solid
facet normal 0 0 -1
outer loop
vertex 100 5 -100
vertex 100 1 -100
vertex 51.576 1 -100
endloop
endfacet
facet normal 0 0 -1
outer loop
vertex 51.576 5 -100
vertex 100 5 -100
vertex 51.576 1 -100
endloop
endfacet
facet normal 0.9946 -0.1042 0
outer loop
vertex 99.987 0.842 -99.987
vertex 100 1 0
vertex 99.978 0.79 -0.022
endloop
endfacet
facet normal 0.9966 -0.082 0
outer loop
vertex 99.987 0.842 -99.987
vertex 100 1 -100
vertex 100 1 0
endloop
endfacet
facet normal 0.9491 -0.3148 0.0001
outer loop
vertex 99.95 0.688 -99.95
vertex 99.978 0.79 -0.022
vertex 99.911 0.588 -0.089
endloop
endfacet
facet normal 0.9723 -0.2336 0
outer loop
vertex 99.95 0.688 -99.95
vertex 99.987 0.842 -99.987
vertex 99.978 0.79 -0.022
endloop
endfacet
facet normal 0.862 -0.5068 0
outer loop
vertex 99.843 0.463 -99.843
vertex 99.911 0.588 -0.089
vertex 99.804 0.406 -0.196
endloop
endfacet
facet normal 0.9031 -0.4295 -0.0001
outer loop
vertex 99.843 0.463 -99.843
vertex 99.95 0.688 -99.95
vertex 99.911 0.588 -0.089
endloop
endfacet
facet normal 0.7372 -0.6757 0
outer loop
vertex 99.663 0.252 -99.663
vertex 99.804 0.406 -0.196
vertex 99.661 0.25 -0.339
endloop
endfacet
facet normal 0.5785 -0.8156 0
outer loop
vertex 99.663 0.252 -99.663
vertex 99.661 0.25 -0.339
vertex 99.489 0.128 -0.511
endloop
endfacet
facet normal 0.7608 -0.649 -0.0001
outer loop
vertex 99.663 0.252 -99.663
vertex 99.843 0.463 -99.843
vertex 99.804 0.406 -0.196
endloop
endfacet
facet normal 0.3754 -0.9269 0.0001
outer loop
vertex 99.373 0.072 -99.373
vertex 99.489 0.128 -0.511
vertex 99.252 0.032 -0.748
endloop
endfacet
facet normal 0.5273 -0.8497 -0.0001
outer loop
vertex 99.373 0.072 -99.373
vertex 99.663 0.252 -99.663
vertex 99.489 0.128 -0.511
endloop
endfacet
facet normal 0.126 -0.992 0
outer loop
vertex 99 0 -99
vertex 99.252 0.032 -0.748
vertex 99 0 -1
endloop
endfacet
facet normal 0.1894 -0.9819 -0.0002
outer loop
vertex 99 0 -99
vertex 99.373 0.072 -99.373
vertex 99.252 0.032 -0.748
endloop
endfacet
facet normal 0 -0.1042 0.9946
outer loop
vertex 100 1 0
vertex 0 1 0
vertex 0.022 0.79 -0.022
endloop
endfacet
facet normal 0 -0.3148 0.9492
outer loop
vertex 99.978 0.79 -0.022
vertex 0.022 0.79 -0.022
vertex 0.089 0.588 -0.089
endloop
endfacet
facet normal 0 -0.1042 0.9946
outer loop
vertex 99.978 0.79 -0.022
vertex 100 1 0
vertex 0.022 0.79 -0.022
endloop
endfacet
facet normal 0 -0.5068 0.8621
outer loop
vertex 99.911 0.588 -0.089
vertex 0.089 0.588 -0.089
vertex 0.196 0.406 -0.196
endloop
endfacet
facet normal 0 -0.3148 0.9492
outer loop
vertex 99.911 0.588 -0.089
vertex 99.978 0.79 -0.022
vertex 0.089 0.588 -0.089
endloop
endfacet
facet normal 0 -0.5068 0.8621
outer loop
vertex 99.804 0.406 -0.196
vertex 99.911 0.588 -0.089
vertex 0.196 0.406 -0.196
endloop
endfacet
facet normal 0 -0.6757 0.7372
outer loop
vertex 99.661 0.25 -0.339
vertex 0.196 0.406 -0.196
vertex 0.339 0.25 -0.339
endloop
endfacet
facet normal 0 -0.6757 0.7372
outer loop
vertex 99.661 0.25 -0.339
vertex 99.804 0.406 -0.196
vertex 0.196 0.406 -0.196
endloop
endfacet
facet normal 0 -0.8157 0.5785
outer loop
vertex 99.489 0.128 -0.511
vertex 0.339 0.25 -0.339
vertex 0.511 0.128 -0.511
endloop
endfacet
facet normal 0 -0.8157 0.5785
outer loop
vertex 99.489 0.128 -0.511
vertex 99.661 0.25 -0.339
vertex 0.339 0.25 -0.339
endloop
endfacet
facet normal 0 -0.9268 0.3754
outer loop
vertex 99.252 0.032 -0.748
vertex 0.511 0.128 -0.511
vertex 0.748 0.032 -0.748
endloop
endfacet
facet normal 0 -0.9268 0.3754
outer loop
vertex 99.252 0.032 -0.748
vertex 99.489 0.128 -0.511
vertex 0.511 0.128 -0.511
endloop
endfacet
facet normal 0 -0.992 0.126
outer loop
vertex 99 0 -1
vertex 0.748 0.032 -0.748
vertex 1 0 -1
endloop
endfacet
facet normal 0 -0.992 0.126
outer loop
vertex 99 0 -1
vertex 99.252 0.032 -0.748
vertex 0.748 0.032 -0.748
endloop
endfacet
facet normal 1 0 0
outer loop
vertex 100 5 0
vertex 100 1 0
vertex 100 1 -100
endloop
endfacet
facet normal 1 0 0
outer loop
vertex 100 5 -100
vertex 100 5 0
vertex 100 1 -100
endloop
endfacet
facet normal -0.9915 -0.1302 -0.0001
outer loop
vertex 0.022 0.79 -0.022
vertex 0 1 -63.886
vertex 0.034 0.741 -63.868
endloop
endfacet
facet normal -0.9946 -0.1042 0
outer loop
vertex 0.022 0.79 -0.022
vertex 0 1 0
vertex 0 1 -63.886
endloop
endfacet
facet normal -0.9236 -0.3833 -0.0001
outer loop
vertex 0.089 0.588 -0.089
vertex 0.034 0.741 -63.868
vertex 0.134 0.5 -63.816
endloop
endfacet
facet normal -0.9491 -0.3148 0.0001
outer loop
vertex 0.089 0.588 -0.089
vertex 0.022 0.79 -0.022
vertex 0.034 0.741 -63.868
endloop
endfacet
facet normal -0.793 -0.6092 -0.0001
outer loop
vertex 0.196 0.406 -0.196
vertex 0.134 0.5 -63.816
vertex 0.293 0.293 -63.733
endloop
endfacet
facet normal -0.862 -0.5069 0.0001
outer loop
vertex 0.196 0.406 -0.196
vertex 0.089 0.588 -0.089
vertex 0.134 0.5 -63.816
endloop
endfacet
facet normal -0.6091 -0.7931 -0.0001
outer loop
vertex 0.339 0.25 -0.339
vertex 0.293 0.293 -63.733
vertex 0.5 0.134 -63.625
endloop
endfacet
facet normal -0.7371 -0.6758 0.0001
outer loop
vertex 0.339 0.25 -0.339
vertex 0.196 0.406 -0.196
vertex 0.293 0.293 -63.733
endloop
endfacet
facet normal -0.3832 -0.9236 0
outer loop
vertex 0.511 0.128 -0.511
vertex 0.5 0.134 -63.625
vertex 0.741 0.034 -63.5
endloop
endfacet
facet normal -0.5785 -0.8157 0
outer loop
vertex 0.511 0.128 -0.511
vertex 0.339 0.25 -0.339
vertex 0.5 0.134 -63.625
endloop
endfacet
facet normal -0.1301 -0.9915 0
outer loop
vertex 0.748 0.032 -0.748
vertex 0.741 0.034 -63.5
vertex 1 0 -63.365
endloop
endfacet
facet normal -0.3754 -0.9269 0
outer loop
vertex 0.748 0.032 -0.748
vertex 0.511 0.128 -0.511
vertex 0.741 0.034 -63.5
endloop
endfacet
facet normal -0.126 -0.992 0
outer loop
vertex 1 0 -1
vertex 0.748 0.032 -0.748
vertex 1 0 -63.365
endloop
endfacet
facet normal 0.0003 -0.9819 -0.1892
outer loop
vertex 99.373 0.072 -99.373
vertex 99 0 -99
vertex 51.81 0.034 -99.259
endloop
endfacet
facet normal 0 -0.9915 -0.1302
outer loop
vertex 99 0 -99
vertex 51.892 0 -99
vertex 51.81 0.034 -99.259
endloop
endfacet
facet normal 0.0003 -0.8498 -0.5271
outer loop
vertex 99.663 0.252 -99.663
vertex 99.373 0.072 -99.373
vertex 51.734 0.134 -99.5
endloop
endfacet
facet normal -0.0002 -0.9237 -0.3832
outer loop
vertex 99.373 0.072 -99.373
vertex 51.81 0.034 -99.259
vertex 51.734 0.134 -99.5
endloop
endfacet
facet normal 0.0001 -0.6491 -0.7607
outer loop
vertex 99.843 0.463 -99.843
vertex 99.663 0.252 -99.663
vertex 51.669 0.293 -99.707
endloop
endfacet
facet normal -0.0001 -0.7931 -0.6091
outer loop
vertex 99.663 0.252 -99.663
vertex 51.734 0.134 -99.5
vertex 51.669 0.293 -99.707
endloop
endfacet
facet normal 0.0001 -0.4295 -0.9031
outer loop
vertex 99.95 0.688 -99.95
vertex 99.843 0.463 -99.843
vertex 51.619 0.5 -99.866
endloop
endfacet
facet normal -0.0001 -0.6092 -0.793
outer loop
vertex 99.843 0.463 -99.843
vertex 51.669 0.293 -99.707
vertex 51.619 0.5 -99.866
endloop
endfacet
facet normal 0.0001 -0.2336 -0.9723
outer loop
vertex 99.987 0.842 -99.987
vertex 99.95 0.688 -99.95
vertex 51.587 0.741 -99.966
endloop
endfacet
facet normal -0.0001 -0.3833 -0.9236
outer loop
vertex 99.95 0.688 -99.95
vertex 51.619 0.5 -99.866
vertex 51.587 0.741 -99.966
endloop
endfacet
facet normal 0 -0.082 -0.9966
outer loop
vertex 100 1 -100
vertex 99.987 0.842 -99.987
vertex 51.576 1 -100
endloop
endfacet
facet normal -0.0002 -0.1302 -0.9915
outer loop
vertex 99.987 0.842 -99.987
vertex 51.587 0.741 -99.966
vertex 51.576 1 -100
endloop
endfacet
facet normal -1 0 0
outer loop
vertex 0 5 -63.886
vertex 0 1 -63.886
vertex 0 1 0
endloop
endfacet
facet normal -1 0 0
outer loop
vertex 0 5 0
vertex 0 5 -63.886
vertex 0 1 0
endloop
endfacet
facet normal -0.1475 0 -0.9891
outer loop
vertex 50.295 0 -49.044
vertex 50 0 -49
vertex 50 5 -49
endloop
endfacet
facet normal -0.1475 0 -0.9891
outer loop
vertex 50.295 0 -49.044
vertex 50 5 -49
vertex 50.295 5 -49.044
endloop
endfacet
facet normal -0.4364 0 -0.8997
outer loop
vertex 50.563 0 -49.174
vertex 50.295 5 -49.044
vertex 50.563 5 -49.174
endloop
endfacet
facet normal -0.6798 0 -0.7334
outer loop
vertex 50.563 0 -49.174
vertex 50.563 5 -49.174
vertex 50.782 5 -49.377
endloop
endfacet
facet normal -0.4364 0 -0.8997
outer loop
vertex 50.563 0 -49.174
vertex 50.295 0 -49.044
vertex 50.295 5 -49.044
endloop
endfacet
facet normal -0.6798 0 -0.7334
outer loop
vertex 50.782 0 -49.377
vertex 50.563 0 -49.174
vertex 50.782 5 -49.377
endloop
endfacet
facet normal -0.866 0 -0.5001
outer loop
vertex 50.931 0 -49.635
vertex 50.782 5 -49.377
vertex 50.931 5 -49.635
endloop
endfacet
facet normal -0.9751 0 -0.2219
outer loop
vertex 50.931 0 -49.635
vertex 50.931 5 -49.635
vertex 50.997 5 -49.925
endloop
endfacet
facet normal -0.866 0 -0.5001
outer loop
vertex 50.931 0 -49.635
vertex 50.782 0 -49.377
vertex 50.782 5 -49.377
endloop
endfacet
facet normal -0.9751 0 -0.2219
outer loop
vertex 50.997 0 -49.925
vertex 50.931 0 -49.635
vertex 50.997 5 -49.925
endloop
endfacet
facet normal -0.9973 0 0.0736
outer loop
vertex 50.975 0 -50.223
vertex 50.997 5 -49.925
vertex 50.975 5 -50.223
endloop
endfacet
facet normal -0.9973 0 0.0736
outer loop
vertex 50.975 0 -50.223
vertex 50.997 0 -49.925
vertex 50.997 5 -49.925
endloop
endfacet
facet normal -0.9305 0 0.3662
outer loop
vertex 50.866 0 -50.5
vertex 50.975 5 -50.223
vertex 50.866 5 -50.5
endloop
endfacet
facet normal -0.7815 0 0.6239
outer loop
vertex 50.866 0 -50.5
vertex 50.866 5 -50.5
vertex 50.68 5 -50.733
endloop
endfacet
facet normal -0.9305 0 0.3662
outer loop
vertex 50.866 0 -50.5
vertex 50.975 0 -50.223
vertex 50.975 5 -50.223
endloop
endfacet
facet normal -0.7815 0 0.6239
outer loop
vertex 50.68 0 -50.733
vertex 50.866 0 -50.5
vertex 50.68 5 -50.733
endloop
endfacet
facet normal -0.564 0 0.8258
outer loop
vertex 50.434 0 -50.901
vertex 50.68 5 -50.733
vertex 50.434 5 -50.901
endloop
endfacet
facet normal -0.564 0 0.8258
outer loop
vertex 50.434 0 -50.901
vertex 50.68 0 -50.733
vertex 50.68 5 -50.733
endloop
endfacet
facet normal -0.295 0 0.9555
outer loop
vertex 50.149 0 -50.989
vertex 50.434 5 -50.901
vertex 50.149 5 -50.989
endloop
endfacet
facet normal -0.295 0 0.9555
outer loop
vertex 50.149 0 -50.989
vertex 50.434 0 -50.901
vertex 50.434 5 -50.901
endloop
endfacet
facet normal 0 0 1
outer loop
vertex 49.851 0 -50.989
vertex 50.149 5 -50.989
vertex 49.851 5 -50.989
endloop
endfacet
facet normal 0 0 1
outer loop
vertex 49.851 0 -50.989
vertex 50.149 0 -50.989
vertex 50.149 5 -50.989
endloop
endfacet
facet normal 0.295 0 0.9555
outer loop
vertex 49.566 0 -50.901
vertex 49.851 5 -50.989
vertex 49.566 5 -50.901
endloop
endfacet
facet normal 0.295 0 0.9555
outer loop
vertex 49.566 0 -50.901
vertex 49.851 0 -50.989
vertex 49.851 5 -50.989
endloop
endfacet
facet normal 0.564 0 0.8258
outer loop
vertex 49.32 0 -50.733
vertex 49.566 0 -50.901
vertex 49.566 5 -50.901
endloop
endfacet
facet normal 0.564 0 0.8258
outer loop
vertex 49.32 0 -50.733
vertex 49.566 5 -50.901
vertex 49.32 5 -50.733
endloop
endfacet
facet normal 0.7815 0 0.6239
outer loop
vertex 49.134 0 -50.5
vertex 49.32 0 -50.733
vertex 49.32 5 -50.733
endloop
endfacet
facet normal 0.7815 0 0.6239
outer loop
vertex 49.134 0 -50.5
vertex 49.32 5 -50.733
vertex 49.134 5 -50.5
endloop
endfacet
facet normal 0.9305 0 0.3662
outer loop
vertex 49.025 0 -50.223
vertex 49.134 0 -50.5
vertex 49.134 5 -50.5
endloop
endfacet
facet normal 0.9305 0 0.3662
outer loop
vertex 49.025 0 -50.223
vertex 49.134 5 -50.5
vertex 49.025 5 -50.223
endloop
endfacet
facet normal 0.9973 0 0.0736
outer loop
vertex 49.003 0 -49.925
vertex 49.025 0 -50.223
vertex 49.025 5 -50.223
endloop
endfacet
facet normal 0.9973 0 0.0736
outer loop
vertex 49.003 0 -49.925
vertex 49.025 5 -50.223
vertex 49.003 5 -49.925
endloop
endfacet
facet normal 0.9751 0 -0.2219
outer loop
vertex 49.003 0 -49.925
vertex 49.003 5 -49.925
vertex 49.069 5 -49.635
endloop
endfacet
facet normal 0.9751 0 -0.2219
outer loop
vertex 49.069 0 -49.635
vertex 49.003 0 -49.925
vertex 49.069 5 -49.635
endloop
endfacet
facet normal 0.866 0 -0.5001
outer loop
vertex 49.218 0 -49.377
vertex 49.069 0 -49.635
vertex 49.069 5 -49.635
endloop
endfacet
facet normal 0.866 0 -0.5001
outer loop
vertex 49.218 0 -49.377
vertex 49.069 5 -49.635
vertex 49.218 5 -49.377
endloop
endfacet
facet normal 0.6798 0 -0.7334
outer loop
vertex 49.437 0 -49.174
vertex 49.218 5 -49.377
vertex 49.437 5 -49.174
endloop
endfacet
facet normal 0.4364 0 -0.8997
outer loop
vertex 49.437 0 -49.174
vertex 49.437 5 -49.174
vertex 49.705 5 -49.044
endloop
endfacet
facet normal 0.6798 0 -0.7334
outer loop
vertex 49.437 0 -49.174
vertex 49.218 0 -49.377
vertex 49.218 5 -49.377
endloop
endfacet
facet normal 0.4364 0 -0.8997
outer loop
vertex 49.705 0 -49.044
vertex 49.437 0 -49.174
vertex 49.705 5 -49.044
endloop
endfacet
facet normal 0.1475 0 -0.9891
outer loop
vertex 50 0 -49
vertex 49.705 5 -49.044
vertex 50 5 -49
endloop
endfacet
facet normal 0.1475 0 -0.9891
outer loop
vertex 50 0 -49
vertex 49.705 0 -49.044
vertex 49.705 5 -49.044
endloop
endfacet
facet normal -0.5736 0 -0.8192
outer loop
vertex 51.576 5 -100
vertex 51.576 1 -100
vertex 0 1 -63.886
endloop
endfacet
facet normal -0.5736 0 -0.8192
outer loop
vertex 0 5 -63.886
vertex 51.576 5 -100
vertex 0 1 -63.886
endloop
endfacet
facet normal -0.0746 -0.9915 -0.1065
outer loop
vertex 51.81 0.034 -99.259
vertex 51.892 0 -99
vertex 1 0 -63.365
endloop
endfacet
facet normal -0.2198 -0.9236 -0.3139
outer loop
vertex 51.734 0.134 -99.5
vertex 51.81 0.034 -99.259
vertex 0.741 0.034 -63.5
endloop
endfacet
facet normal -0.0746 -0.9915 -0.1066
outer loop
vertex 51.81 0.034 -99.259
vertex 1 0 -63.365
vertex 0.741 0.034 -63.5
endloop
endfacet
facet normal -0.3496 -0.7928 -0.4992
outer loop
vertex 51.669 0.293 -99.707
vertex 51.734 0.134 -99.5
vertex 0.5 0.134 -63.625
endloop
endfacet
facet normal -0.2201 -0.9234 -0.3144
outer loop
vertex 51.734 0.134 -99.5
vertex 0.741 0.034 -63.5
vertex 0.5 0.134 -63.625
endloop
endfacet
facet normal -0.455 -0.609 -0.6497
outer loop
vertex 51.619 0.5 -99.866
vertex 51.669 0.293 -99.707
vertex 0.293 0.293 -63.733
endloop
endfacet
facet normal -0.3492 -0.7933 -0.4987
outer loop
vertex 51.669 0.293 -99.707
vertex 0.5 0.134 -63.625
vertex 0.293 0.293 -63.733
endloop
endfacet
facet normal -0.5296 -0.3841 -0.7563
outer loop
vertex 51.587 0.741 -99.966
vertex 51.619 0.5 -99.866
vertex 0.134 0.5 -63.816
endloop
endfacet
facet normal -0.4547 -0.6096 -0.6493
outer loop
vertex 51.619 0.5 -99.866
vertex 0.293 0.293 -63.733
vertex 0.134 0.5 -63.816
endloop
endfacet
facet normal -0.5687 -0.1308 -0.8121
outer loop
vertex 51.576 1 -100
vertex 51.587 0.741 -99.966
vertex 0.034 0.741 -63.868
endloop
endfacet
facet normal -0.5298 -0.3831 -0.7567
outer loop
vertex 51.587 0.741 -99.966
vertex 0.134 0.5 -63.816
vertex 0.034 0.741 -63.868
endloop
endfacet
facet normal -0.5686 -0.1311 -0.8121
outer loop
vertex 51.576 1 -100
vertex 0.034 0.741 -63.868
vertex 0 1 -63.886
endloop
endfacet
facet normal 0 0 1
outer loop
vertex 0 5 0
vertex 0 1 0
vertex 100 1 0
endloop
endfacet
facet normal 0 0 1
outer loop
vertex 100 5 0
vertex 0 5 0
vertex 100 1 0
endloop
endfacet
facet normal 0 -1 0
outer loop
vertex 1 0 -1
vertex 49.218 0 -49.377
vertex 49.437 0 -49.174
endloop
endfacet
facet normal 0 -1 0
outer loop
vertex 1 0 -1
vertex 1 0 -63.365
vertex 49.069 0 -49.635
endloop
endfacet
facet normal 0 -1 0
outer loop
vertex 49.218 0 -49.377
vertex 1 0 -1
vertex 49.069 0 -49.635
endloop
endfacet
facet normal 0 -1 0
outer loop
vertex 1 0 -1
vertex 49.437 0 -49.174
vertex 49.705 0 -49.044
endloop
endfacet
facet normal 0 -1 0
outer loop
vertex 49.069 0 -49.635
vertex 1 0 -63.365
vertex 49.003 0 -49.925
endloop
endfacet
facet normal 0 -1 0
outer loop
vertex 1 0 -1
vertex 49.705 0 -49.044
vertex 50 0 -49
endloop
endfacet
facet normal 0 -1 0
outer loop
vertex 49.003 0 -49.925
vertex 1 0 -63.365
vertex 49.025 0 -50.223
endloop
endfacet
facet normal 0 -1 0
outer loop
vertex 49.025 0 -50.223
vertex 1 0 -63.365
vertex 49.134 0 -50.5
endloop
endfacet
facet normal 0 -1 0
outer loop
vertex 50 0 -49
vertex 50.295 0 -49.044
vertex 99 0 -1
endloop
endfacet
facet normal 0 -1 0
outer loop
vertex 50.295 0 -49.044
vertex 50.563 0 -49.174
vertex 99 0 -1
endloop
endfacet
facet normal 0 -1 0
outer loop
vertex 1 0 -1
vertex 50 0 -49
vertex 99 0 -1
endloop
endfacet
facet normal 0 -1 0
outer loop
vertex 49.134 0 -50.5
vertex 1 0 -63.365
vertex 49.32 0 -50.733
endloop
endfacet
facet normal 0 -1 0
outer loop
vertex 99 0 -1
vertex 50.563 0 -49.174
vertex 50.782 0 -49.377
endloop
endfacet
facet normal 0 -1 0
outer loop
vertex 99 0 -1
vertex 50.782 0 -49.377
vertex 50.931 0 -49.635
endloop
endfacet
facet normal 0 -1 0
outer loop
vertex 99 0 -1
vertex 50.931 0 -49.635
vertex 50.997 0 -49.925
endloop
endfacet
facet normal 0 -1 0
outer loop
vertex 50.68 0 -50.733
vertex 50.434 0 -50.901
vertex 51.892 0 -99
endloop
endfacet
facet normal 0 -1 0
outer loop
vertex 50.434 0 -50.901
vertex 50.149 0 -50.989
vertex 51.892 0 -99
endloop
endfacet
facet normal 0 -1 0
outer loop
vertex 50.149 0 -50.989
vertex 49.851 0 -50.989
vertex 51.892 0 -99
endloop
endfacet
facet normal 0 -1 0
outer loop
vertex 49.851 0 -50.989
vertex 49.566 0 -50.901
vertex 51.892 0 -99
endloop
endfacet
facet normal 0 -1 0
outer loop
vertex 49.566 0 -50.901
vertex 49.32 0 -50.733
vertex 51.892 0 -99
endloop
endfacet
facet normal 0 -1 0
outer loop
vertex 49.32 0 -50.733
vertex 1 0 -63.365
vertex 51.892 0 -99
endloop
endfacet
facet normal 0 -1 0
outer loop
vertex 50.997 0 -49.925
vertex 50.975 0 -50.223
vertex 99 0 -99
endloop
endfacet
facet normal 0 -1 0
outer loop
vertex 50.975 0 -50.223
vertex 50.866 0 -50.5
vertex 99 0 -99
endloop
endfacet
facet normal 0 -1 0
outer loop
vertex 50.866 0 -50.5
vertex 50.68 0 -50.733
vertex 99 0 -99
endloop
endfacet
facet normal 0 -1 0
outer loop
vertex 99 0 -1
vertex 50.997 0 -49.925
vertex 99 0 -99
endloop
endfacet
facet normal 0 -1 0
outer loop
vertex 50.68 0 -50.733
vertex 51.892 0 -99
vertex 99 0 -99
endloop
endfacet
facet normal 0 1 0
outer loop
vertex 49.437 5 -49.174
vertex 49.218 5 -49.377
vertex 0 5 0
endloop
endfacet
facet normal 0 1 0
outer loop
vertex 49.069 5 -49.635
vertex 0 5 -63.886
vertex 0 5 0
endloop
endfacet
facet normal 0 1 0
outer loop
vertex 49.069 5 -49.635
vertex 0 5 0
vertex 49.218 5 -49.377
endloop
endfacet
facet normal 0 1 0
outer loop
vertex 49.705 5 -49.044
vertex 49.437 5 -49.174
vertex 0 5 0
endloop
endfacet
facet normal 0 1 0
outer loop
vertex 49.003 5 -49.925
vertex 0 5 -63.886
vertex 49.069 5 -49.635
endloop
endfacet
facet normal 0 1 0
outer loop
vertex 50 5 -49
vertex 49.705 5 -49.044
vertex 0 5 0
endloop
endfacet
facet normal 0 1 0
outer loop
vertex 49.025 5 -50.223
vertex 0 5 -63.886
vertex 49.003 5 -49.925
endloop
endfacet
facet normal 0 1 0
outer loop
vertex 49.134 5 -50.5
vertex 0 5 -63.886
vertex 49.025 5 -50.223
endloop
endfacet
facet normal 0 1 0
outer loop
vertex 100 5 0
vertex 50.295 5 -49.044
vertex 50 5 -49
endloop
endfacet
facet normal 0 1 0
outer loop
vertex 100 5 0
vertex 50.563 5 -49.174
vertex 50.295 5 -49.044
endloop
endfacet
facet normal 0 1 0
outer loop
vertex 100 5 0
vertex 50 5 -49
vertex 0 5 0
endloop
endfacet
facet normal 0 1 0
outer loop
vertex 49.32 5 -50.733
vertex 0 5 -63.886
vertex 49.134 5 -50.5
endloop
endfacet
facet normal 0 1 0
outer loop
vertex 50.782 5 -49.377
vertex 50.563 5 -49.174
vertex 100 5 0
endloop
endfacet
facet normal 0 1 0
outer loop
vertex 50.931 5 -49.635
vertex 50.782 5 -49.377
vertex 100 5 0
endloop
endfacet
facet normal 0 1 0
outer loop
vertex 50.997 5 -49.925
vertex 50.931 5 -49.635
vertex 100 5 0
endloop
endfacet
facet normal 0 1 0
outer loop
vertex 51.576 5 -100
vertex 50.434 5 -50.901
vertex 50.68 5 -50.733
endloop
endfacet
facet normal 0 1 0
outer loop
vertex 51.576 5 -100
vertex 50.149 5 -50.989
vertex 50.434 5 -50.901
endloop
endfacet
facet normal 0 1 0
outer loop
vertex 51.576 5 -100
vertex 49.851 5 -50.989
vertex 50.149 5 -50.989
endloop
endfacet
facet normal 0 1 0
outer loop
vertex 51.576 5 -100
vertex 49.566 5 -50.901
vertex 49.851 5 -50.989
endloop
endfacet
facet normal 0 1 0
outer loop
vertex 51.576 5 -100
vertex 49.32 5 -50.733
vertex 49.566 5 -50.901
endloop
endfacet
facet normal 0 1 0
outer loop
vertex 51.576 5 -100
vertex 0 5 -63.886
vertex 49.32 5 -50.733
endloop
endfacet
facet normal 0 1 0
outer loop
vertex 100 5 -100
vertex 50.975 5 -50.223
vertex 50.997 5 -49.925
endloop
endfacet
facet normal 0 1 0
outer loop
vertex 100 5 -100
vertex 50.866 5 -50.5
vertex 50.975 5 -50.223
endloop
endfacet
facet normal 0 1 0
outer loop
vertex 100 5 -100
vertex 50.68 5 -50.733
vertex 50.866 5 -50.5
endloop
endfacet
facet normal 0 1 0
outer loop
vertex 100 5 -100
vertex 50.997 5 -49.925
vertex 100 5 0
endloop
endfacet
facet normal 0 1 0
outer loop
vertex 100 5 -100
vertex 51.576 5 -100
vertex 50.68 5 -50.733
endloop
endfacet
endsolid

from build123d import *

# Parameters (mm, degrees)
BOSS_EXTRUDE1_DEPTH = 5
SKETCH2_R           = 1
CUT_EXTRUDE2_DEPTH  = 5
FILLET1_R           = 1


with BuildPart() as part:
    # Sketch1 → Boss-Extrude1 (new body)
    with BuildSketch(Plane(origin=(0, 0, 0), x_dir=(1, 0, 0), z_dir=(0, 1, 0))):
        Polygon((0, 0), (100, 0), (100, 100), (51.57649394, 100), (0, 63.88575015), align=None)
    extrude(amount=BOSS_EXTRUDE1_DEPTH)

    # Sketch2 → Cut-Extrude2 (cut)
    with BuildSketch(Plane(origin=(0, 0, 0), x_dir=(1, 0, 0), z_dir=(0, 1, 0))):
        with Locations(Location((50, 50, 0), (0, 0, 270))):
            Circle(SKETCH2_R)
    extrude(amount=CUT_EXTRUDE2_DEPTH, mode=Mode.SUBTRACT)

    # Fillet1
    fillet1_edges = [part.edges().sort_by_distance(p)[0] for p in [
        (25.78824697, 0, -81.942875075),
        (75.78824697, 0, -100),
        (100, 0, -50),
        (50, 0, 0),
        (0, 0, -31.942875075),
    ]]
    fillet(fillet1_edges, radius=FILLET1_R)


solid = part.part
